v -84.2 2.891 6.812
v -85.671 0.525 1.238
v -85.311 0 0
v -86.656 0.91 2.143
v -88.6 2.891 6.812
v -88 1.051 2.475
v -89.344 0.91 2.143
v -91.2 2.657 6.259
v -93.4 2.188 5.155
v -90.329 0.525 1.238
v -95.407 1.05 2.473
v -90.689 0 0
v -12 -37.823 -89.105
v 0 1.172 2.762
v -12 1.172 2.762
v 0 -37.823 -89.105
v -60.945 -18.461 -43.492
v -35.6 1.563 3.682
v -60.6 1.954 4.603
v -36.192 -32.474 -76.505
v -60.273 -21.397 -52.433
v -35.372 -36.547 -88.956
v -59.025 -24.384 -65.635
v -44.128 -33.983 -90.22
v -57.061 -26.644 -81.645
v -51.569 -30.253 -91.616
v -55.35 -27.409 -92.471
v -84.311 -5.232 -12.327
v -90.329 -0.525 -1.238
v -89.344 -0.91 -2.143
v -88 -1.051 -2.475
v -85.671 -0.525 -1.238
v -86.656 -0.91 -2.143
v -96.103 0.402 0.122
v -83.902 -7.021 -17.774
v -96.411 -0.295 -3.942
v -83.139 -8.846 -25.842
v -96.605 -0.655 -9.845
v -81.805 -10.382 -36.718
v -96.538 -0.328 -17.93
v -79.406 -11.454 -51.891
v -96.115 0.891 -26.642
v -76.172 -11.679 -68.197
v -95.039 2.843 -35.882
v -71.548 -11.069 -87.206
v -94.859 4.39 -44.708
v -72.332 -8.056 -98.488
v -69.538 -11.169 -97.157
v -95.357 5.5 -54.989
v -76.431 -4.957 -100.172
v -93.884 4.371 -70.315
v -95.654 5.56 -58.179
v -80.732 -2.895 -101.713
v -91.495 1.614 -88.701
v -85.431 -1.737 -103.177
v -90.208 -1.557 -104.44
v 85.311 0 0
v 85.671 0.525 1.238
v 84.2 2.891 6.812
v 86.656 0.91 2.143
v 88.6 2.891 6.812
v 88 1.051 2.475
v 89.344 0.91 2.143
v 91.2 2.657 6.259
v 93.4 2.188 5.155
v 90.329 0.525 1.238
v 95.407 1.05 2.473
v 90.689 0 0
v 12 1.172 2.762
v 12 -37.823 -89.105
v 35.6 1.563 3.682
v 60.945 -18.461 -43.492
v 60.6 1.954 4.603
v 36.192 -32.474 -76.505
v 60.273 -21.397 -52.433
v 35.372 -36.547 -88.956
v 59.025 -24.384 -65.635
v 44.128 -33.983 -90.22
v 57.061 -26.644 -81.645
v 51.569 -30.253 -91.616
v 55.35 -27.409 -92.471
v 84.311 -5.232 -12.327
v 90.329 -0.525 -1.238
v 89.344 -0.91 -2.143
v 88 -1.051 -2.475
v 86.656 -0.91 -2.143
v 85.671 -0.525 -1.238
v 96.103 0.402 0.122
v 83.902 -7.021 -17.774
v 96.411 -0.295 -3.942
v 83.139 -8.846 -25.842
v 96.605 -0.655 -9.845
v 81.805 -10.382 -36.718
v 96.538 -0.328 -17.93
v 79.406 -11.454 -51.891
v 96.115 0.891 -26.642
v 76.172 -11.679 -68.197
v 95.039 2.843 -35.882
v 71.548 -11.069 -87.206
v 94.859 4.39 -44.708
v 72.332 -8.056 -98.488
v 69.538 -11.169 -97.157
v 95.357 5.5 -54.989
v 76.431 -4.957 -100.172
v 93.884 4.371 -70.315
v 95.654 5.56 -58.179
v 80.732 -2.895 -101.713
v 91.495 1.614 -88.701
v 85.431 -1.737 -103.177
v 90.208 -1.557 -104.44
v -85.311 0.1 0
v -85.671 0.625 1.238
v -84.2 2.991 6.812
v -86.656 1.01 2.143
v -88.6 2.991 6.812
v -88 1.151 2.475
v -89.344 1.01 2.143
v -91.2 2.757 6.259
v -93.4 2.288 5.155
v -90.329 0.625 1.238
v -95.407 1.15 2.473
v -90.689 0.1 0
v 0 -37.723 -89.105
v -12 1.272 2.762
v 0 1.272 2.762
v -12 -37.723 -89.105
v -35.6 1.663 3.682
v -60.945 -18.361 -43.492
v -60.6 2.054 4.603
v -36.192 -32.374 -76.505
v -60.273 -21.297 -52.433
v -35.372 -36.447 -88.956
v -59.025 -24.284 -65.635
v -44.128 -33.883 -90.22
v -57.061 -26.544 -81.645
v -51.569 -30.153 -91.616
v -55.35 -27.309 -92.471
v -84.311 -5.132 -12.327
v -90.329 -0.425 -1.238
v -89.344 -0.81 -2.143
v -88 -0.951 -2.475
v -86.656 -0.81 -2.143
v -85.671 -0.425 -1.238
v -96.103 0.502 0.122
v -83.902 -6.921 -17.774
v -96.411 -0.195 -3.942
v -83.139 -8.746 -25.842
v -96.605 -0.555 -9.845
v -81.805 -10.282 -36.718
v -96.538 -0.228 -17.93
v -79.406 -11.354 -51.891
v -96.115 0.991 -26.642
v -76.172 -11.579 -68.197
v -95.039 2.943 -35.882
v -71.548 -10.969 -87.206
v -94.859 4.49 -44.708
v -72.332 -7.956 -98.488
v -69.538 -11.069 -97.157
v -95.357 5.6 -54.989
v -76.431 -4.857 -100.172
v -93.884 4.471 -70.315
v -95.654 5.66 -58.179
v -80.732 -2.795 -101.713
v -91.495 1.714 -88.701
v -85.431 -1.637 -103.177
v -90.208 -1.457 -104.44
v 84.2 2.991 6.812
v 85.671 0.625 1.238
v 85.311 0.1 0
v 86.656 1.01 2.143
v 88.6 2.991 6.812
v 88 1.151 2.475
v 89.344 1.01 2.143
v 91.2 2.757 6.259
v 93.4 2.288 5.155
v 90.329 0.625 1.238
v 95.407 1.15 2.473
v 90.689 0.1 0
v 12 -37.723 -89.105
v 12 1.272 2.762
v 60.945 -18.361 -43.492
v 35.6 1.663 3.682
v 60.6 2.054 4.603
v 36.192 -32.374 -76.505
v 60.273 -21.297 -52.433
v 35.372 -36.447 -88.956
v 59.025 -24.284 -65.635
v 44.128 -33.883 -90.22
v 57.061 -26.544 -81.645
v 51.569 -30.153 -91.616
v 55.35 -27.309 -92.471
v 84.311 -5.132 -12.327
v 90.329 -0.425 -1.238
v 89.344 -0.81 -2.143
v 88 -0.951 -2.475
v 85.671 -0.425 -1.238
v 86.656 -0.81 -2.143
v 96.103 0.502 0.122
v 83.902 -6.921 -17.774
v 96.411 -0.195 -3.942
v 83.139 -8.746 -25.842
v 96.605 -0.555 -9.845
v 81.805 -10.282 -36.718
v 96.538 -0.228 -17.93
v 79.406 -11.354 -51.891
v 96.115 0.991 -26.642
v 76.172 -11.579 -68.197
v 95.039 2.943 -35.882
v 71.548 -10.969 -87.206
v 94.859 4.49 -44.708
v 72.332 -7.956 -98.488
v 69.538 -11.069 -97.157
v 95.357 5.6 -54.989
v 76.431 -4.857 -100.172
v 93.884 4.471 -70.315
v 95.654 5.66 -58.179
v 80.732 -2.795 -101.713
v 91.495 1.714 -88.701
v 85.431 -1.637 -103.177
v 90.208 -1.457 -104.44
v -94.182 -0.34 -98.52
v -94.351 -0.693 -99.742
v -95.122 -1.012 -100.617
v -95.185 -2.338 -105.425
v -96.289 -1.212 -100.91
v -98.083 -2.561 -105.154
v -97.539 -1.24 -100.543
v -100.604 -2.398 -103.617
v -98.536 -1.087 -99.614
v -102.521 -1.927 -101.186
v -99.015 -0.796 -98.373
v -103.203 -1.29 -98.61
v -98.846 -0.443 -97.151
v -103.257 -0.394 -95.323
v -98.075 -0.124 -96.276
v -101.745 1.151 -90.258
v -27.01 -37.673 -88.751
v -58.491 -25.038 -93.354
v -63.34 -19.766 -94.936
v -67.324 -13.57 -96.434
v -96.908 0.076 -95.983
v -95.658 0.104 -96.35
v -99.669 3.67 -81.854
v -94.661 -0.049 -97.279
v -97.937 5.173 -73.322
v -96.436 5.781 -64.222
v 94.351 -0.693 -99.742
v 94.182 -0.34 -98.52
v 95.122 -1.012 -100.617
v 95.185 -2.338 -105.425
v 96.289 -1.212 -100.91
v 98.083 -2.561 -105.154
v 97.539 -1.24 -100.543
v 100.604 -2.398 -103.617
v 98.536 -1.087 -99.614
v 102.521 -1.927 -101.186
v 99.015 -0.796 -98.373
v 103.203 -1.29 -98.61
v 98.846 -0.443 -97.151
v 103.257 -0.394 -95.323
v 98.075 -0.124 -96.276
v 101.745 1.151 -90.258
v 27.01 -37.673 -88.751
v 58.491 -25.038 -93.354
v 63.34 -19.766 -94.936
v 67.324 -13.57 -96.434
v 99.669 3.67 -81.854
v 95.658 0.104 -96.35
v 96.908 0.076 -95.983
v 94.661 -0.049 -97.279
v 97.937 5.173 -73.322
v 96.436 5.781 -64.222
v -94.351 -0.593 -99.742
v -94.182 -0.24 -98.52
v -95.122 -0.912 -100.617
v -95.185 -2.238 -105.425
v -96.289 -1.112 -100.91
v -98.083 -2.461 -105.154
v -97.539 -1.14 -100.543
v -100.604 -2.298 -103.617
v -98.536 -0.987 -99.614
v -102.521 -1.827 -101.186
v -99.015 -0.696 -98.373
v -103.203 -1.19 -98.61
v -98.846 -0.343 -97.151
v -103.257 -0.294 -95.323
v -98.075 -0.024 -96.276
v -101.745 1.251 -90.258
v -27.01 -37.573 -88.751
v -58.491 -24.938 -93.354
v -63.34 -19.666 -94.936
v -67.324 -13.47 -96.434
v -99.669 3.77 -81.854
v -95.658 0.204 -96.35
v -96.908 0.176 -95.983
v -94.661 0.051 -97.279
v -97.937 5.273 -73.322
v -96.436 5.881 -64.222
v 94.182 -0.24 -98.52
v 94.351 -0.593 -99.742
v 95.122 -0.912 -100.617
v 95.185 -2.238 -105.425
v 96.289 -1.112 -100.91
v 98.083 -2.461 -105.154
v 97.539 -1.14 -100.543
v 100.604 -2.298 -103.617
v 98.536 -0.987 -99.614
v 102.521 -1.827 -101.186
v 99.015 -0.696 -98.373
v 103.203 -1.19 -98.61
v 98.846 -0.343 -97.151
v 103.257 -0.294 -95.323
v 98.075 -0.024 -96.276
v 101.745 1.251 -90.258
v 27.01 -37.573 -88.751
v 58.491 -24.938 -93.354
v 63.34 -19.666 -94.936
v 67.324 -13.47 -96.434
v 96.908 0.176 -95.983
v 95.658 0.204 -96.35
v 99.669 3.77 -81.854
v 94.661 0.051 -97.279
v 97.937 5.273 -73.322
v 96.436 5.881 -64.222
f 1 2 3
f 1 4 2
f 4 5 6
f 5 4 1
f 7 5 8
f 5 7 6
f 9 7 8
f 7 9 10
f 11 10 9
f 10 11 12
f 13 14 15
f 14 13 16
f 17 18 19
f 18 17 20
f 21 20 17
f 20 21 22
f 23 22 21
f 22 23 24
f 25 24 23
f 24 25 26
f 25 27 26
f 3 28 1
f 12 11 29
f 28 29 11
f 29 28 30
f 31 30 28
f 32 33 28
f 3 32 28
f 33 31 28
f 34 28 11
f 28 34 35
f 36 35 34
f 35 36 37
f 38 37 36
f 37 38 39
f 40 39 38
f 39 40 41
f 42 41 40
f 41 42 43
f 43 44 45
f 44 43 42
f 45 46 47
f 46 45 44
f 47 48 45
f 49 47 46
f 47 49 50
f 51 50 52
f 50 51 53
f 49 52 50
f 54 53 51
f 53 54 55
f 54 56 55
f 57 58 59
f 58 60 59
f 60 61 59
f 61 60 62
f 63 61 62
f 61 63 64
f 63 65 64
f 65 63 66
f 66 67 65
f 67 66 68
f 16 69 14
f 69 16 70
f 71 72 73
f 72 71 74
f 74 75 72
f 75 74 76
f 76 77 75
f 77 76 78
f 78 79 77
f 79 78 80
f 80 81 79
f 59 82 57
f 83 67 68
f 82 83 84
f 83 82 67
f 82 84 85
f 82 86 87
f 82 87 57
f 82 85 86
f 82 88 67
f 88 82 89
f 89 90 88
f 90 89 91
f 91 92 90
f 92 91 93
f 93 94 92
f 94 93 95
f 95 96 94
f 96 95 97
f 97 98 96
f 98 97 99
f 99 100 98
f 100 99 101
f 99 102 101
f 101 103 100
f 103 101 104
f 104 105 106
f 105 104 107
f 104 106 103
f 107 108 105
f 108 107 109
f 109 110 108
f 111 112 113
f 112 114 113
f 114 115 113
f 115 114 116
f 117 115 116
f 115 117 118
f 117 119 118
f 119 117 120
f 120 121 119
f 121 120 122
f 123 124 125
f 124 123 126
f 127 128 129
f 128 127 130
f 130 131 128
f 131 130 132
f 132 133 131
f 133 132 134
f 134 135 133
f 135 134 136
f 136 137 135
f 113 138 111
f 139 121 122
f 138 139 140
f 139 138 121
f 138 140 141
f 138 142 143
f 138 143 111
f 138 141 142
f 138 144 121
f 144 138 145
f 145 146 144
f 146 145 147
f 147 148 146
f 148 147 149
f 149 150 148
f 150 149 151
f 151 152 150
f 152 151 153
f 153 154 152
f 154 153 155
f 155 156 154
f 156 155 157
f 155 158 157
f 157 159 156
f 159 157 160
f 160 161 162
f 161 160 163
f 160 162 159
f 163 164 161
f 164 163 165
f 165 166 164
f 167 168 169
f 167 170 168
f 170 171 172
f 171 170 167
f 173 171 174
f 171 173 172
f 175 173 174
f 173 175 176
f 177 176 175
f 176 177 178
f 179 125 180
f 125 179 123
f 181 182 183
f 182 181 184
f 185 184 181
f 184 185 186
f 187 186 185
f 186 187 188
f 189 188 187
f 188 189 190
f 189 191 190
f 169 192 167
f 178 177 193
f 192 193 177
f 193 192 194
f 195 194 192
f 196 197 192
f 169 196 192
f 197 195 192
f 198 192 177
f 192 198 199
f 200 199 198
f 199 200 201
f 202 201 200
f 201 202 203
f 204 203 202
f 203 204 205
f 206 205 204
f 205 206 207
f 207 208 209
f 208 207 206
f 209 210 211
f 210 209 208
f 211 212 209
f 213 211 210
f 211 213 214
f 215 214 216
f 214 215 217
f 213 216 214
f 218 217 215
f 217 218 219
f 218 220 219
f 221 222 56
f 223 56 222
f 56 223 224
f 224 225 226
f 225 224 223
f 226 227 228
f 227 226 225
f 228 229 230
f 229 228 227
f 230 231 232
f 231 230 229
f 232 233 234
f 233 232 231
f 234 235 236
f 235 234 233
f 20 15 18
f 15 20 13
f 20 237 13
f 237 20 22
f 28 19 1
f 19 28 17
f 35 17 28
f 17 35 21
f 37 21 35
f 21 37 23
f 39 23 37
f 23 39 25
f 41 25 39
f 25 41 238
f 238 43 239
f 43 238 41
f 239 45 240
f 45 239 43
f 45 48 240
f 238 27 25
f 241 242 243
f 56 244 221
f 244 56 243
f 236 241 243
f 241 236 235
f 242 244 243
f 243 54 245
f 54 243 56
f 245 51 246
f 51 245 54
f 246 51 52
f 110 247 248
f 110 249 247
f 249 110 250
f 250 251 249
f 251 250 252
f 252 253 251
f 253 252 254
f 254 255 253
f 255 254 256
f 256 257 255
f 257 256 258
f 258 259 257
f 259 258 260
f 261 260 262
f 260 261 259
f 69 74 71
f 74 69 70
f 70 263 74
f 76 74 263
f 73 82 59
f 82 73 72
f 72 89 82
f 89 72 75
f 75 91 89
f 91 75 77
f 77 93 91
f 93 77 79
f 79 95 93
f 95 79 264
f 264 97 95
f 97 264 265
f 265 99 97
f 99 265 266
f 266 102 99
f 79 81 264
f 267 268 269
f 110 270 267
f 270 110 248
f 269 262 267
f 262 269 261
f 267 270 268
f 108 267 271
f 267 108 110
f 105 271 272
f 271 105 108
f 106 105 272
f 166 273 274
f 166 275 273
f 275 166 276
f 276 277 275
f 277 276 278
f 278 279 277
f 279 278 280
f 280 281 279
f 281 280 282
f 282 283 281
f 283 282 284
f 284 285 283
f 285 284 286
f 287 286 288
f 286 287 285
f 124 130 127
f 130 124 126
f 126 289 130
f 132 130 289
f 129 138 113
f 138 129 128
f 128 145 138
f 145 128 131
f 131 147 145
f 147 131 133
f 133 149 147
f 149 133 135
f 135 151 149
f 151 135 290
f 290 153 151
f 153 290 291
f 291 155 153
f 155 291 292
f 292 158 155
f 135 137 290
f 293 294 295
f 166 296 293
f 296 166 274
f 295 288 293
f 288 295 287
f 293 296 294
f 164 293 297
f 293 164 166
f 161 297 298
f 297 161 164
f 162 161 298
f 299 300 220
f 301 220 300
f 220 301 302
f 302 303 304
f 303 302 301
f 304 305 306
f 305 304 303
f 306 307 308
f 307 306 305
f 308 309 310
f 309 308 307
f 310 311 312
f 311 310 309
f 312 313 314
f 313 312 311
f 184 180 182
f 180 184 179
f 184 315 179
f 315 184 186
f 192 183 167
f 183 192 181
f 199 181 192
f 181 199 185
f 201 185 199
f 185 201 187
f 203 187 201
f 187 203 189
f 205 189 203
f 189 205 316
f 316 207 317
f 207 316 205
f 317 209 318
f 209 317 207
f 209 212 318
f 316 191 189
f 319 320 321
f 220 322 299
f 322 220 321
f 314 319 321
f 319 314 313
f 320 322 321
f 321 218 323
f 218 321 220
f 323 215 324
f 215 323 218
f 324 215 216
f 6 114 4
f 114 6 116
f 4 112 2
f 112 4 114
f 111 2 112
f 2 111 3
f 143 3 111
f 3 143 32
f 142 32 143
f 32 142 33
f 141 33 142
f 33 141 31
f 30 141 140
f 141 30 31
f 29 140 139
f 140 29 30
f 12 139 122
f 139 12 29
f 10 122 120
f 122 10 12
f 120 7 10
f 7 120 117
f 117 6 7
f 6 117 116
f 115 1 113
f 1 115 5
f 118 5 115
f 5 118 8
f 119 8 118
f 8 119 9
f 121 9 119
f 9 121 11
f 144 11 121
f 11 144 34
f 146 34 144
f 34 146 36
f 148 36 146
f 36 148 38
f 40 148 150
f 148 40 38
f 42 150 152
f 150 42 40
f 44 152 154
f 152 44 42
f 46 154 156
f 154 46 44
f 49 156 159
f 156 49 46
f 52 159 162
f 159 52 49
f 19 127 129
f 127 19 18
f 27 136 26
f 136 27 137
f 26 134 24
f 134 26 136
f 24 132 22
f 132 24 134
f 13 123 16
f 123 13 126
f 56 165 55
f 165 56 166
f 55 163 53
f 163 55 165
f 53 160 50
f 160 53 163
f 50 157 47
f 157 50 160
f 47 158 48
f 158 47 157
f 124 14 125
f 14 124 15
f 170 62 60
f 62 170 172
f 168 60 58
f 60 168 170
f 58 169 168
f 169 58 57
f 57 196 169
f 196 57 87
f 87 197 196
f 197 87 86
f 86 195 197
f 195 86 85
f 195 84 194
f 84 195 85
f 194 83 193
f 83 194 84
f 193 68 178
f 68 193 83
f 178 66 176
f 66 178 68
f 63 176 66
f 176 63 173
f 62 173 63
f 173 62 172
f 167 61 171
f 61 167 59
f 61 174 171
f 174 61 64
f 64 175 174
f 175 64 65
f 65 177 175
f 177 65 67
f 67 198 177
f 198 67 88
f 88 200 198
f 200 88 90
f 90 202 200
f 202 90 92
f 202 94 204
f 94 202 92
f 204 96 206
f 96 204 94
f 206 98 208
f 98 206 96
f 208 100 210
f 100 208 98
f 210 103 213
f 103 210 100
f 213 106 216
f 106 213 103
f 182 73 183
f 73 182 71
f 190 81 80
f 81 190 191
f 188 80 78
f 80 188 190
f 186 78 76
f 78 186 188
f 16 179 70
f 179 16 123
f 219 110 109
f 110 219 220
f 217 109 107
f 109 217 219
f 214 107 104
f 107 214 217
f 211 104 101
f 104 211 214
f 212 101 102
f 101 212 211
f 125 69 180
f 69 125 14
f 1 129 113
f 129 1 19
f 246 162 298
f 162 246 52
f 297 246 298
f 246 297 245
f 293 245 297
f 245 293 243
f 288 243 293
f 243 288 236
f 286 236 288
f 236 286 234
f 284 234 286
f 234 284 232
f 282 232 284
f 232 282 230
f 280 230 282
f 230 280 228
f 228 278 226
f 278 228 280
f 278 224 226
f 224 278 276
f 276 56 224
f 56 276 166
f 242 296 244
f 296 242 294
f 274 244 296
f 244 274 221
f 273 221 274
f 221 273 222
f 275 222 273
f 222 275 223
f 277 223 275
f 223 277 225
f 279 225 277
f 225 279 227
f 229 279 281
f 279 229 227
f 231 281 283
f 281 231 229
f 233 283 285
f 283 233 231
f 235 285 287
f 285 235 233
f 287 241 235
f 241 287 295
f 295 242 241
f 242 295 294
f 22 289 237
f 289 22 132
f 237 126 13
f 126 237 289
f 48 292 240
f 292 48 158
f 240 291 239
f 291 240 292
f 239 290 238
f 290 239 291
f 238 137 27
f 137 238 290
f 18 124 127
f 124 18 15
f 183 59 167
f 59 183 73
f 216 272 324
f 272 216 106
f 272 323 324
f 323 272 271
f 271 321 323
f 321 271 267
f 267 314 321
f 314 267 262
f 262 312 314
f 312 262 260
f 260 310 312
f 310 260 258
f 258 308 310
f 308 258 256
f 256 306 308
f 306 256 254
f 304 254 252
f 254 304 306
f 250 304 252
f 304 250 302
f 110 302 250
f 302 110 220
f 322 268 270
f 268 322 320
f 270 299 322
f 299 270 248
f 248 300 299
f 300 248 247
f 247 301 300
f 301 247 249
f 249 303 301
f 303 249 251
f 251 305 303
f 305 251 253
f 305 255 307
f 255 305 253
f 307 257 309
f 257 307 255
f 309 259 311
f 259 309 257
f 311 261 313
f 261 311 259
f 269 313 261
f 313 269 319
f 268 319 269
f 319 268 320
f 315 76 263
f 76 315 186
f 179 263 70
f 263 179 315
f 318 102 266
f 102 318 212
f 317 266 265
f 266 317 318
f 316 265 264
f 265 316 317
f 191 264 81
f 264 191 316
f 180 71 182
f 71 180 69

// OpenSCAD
// file: ../p/rect2p.scad
use <../lib.scad>
function ldraw_lib__rect2p() = [
// 0 Rectangle with 2 Parallel Edges
// 0 Name: rect2p.dat
// 0 Author: Donald Sutter [technog]
// 0 !LDRAW_ORG Primitive UPDATE 2010-01
// 0 !LICENSE Licensed under CC BY 4.0 : see CAreadme.txt
// 
// 0 BFC CERTIFY CCW
  [0,"BFC","CERTIFY"],
  [0,"BFC","CCW"],
// 
// 0 !HISTORY 2003-08-01 [PTadmin] Official Update 2003-02
// 0 !HISTORY 2007-06-24 [PTadmin] Header formatted for Contributor Agreement
// 0 !HISTORY 2008-07-01 [PTadmin] Official Update 2008-01
// 0 !HISTORY 2010-01-17 [mikeheide] changed winding to CCW
// 0 !HISTORY 2010-04-05 [PTadmin] Official Update 2010-01
// 
// 
// 2 24 1 0 1 -1 0 1
  [2,24,1,0,1,-1,0,1],
// 2 24 -1 0 -1 1 0 -1
  [2,24,-1,0,-1,1,0,-1],
// 4 16 -1 0 1 -1 0 -1 1 0 -1 1 0 1
  [4,16,-1,0,1,-1,0,-1,1,0,-1,1,0,1],
// 0
];
module ldraw_lib__rect2p(step=0, col=false, unit=2/5, alt=false, line=0.2, solid=!$preview)
    makepoly(ldraw_lib__rect2p(), step=step, col=col, unit=unit, alt=alt, line=line, solid=solid);
ldraw_lib__rect2p(line=0.2);
// main file
use <../lib.scad>
use <s/u9495c01s01.scad>
use <s/u9495c01s02.scad>
use <s/u9495c01s03.scad>
use <s/u9495c01s04.scad>
function ldraw_lib__u9495p01c01() = [
// 0 Sail 30 x 15 Trapezoidal with Thick Stripes on White Background Pattern (Formed Shape 1)
// 0 Name: u9495p01c01.dat
// 0 Author: Philippe Hurbain [Philo]
// 0 !LDRAW_ORG Part UPDATE 2025-05
// 0 !LICENSE Licensed under CC BY 4.0 : see CAreadme.txt
// 
// 0 BFC CERTIFY CCW
  [0,"BFC","CERTIFY"],
  [0,"BFC","CCW"],
// 
// 0 !CATEGORY Sheet Fabric
// 0 !KEYWORDS Black Seas Barracuda, BrickLink sailbb21, Caribbean Clipper
// 0 !KEYWORDS Rebrickable upn0034pr0001, set 10040, Set 6274, set 6285
// 
// 0 !HISTORY 2020-12-29 [PTadmin] Official Update 2020-03
// 0 !HISTORY 2025-04-27 [Holly-Wood] Changed color
// 0 !HISTORY 2025-05-28 [OrionP] Official Update 2025-05
// 
// 1 16 0 0 0 1 0 0 0 1 0 0 0 1 s\u9495c01s01.dat
  [1,16,0,0,0,1,0,0,0,1,0,0,0,1, ldraw_lib__s__u9495c01s01()],
// 1 16 0 0 0 -1 0 0 0 1 0 0 0 1 s\u9495c01s01.dat
  [1,16,0,0,0,-1,0,0,0,1,0,0,0,1, ldraw_lib__s__u9495c01s01()],
// 0 BFC INVERTNEXT
  [0,"BFC","INVERTNEXT"],
// 1 16 0 0 0.25 1 0 0 0 1 0 0 0 1 s\u9495c01s01.dat
  [1,16,0,0,0.25,1,0,0,0,1,0,0,0,1, ldraw_lib__s__u9495c01s01()],
// 0 BFC INVERTNEXT
  [0,"BFC","INVERTNEXT"],
// 1 16 0 0 0.25 -1 0 0 0 1 0 0 0 1 s\u9495c01s01.dat
  [1,16,0,0,0.25,-1,0,0,0,1,0,0,0,1, ldraw_lib__s__u9495c01s01()],
// 
// 1 20015 0 0 0 1 0 0 0 1 0 0 0 1 s\u9495c01s02.dat
  [1,20015,0,0,0,1,0,0,0,1,0,0,0,1, ldraw_lib__s__u9495c01s02()],
// 1 20015 0 0 0 -1 0 0 0 1 0 0 0 1 s\u9495c01s02.dat
  [1,20015,0,0,0,-1,0,0,0,1,0,0,0,1, ldraw_lib__s__u9495c01s02()],
// 0 BFC INVERTNEXT
  [0,"BFC","INVERTNEXT"],
// 1 20015 0 0 0.25 1 0 0 0 1 0 0 0 1 s\u9495c01s02.dat
  [1,20015,0,0,0.25,1,0,0,0,1,0,0,0,1, ldraw_lib__s__u9495c01s02()],
// 0 BFC INVERTNEXT
  [0,"BFC","INVERTNEXT"],
// 1 20015 0 0 0.25 -1 0 0 0 1 0 0 0 1 s\u9495c01s02.dat
  [1,20015,0,0,0.25,-1,0,0,0,1,0,0,0,1, ldraw_lib__s__u9495c01s02()],
// 
// 1 16 0 0 0 1 0 0 0 1 0 0 0 1 s\u9495c01s03.dat
  [1,16,0,0,0,1,0,0,0,1,0,0,0,1, ldraw_lib__s__u9495c01s03()],
// 1 16 0 0 0 -1 0 0 0 1 0 0 0 1 s\u9495c01s03.dat
  [1,16,0,0,0,-1,0,0,0,1,0,0,0,1, ldraw_lib__s__u9495c01s03()],
// 
// 1 20015 0 0 0 1 0 0 0 1 0 0 0 1 s\u9495c01s04.dat
  [1,20015,0,0,0,1,0,0,0,1,0,0,0,1, ldraw_lib__s__u9495c01s04()],
// 1 20015 0 0 0 -1 0 0 0 1 0 0 0 1 s\u9495c01s04.dat
  [1,20015,0,0,0,-1,0,0,0,1,0,0,0,1, ldraw_lib__s__u9495c01s04()],
];
module ldraw_lib__u9495p01c01(step=0, col=false, unit=2/5, alt=false, line=0.2, solid=!$preview)
    makepoly(ldraw_lib__u9495p01c01(), step=step, col=col, unit=unit, alt=alt, line=line, solid=solid);
ldraw_lib__u9495p01c01(line=0.2);
